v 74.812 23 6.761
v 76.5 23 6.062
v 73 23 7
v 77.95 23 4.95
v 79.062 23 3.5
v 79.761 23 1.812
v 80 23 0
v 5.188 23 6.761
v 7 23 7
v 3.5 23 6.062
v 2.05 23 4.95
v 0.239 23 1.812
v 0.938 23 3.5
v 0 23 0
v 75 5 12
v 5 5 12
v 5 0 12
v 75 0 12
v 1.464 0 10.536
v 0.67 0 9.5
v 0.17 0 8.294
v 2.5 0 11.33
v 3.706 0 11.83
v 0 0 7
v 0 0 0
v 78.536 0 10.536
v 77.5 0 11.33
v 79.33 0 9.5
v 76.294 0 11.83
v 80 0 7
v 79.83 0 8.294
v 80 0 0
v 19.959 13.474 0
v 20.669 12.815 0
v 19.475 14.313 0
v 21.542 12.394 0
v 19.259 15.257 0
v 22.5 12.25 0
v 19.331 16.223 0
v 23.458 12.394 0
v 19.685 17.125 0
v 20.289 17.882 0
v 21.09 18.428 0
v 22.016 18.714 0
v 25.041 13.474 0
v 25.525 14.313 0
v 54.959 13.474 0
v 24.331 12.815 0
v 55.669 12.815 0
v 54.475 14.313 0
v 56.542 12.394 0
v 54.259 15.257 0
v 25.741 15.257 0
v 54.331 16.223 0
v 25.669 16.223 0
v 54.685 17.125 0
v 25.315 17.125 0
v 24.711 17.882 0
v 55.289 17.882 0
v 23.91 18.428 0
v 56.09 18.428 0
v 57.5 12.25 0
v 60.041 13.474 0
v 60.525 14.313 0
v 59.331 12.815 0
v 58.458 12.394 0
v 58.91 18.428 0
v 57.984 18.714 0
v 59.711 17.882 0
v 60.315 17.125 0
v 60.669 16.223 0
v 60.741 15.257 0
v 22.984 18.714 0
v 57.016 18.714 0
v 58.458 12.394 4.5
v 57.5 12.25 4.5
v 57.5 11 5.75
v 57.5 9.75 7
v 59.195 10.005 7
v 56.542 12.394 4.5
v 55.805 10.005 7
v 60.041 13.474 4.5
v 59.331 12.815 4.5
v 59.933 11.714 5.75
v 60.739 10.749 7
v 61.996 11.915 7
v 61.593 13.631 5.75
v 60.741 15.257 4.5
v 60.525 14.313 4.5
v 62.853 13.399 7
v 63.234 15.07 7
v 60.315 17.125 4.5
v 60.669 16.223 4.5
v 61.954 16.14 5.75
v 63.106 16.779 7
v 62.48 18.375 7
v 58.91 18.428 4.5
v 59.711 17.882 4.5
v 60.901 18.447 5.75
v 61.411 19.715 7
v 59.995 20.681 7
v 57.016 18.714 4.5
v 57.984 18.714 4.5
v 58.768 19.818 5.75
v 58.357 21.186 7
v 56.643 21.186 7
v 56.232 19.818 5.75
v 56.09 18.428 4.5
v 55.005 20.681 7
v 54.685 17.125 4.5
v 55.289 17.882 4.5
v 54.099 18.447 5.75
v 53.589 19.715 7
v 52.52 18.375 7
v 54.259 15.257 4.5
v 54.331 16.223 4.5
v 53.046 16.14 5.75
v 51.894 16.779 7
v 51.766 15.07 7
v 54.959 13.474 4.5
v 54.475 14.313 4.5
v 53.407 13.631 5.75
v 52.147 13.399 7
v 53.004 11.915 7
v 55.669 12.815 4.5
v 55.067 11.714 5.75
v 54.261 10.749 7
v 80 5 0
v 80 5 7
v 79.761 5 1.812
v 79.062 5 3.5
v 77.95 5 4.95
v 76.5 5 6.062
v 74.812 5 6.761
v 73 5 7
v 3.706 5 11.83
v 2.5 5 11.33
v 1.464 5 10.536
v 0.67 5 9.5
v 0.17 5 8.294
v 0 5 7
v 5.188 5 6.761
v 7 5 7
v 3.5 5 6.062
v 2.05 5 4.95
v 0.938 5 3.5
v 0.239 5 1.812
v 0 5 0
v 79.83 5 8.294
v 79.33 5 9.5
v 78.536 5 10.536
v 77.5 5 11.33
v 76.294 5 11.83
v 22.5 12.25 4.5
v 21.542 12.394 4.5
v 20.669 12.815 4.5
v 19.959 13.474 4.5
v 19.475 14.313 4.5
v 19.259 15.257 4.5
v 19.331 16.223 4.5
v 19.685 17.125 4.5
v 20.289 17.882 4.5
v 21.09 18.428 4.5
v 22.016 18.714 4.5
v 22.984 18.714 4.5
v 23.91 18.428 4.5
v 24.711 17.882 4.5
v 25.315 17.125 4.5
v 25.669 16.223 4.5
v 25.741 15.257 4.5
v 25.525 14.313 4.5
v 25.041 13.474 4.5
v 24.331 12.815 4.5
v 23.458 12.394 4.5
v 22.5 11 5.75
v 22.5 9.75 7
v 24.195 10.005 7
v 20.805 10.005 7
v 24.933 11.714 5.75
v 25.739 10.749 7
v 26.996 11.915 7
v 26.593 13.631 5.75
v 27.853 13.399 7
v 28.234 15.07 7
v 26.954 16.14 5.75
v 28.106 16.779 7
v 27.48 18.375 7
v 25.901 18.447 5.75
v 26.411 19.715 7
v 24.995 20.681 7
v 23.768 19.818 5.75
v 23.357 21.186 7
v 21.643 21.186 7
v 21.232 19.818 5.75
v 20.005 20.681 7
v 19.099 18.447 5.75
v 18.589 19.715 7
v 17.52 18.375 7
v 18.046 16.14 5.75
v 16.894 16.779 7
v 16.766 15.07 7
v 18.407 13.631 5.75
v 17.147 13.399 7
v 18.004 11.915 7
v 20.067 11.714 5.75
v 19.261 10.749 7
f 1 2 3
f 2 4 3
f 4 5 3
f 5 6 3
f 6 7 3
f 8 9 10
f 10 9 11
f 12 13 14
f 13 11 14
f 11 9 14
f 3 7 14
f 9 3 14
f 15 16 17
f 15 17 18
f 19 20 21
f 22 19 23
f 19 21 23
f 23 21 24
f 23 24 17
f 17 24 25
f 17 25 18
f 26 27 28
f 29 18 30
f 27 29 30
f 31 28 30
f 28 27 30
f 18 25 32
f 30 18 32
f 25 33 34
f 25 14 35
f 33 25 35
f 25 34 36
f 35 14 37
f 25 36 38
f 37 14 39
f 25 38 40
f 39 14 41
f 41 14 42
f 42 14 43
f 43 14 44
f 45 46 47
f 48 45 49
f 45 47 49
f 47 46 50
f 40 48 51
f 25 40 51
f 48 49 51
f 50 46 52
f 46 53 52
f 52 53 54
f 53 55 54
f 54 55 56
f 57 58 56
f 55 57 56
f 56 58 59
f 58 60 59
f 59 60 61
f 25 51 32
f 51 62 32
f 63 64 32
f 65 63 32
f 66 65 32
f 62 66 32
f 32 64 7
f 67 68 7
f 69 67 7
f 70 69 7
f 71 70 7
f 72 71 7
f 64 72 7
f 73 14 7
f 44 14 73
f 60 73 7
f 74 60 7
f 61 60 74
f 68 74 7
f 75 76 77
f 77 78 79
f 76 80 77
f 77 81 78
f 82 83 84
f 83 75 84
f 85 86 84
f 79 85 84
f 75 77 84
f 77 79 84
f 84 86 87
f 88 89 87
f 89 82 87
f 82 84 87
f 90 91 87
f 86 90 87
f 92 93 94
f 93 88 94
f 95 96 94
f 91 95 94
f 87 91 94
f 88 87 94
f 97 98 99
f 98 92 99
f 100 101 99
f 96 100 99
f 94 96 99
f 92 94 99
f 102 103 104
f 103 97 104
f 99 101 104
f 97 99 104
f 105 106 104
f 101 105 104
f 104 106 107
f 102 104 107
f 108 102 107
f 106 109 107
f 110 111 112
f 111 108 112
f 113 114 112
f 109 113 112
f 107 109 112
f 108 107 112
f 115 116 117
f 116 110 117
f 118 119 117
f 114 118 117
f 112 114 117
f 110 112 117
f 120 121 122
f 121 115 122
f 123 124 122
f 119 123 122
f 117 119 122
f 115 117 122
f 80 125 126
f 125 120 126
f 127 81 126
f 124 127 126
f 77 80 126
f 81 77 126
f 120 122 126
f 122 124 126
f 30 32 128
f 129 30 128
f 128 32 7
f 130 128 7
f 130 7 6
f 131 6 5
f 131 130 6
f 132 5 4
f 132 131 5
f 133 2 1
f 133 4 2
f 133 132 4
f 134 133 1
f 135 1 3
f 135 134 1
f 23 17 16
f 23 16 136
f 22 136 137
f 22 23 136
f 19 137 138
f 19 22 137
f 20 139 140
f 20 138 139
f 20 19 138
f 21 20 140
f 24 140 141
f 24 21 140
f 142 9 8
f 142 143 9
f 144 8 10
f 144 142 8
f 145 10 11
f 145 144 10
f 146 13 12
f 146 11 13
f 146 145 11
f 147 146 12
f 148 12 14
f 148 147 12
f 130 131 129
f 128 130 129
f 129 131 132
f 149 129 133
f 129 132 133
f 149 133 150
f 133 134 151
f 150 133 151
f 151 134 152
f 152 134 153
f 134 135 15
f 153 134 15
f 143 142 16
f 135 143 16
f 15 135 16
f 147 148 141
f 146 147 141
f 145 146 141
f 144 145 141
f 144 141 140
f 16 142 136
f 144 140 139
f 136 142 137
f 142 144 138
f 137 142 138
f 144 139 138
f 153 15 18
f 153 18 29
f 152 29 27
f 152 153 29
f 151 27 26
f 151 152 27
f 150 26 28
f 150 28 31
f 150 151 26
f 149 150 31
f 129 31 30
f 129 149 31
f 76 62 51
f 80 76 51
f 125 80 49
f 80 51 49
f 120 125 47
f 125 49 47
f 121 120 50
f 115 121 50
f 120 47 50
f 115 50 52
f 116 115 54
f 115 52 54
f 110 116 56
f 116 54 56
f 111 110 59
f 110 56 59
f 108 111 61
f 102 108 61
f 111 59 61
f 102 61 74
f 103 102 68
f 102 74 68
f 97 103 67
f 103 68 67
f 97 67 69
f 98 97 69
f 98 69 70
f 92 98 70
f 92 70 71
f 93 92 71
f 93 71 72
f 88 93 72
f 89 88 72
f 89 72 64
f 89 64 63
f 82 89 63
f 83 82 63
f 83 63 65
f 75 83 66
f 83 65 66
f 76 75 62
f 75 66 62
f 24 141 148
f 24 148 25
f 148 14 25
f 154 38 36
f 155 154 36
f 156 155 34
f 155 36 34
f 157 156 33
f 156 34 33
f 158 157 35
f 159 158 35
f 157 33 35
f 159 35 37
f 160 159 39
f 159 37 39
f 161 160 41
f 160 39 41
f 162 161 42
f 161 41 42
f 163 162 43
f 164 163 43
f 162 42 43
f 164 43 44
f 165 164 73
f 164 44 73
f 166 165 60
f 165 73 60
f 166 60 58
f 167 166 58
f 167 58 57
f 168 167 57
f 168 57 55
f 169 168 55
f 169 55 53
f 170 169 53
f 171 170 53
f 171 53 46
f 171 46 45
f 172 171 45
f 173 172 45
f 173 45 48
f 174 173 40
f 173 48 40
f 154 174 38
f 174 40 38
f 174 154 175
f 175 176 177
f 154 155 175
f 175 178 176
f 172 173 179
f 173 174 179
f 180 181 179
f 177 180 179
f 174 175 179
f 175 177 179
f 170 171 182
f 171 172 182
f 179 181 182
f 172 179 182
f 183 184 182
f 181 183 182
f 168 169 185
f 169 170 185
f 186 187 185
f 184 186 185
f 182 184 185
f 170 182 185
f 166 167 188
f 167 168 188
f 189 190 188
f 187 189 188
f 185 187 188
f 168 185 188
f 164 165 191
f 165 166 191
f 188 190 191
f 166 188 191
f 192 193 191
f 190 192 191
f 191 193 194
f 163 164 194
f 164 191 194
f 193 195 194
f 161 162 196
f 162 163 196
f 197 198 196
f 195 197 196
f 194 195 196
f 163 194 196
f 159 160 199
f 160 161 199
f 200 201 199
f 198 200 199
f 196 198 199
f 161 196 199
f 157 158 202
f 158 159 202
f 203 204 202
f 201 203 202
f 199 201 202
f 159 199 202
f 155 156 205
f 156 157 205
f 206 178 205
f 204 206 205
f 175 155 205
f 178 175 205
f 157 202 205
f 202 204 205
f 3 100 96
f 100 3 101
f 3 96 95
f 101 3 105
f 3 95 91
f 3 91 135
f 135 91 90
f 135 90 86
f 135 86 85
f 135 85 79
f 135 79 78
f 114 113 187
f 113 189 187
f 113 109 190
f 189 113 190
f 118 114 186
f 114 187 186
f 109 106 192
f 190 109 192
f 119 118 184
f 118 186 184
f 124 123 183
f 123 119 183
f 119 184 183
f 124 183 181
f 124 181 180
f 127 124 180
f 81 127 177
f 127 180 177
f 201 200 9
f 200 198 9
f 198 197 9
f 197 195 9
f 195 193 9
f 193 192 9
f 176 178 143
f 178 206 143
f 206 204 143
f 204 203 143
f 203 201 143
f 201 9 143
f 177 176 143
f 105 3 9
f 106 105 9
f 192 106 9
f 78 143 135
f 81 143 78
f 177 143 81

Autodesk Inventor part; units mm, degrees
ref_plane "YZ Plane" through (0, 0, 0) normal (1, 0, 0) x (0, 1, 0)
ref_plane "XZ Plane" through (0, 0, 0) normal (0, 1, 0) x (-1, 0, 0)
ref_plane "XY Plane" through (0, 0, 0) normal (0, 0, 1) x (1, 0, 0)
sketch "Sketch1" plane through (0, 0, 0) normal (0, 0, 1) x (1, 0, 0)
  line L0 (0, 0) -> (80, 0)
  line L1 (80, 0) -> (80, 23)
  line L2 (80, 23) -> (0, 23)
  line L3 (0, 23) -> (0, 0)
  dimension "d0" = 80
  dimension "d1" = 23
extrude "Extrusion1" add sketch "Sketch1" along normal blind 12
sketch "Sketch2" plane through (0, 0, 0) normal (-1, 0, 0) x (0, 0, 1)
  line L0 (0, 23) -> (0, 0) projected
  line L1 (0, 0) -> (12, 0) projected
  line L2 (12, 23) -> (7, 23)
  line L3 (7, 23) -> (7, 5)
  line L4 (7, 5) -> (12, 5)
  line L5 (12, 5) -> (12, 23)
  dimension "d4" = 7
  dimension "d5" = 5
extrude "Extrusion2" cut sketch "Sketch2" against normal blind 80
sketch "Sketch3" plane through (0, 5, 7) normal (0, 0, 1) x (1, 0, 0)
  line L0 (0, 18) -> (80, 18) projected
  line L1 (0, 0) -> (0, 18) projected
  point P0 (0, -5)
  point P1 (22.5, 10.5)
  point P2 (57.5, 10.5)
  dimension "d8" = 7.5
  dimension "d9" = 7.5
  dimension "d10" = 35
  dimension "d11" = 22.5
hole "Hole1" at (22.5, 15.5, 7) at (57.5, 15.5, 7) direction (0, 0, -1) diameter 6.5 depth 7 tip angle 118 countersink diameter 11.5 countersink angle 90
fillet "Fillet1" radius 7 2 edges at (0, 14, 7) (80, 14, 7)
fillet "Fillet2" radius 5 2 edges at (0, 2.5, 12) (80, 2.5, 12)
properties part number "PÁRA-CHOQUE DIANTEIRO" material "Carbon Steel"
